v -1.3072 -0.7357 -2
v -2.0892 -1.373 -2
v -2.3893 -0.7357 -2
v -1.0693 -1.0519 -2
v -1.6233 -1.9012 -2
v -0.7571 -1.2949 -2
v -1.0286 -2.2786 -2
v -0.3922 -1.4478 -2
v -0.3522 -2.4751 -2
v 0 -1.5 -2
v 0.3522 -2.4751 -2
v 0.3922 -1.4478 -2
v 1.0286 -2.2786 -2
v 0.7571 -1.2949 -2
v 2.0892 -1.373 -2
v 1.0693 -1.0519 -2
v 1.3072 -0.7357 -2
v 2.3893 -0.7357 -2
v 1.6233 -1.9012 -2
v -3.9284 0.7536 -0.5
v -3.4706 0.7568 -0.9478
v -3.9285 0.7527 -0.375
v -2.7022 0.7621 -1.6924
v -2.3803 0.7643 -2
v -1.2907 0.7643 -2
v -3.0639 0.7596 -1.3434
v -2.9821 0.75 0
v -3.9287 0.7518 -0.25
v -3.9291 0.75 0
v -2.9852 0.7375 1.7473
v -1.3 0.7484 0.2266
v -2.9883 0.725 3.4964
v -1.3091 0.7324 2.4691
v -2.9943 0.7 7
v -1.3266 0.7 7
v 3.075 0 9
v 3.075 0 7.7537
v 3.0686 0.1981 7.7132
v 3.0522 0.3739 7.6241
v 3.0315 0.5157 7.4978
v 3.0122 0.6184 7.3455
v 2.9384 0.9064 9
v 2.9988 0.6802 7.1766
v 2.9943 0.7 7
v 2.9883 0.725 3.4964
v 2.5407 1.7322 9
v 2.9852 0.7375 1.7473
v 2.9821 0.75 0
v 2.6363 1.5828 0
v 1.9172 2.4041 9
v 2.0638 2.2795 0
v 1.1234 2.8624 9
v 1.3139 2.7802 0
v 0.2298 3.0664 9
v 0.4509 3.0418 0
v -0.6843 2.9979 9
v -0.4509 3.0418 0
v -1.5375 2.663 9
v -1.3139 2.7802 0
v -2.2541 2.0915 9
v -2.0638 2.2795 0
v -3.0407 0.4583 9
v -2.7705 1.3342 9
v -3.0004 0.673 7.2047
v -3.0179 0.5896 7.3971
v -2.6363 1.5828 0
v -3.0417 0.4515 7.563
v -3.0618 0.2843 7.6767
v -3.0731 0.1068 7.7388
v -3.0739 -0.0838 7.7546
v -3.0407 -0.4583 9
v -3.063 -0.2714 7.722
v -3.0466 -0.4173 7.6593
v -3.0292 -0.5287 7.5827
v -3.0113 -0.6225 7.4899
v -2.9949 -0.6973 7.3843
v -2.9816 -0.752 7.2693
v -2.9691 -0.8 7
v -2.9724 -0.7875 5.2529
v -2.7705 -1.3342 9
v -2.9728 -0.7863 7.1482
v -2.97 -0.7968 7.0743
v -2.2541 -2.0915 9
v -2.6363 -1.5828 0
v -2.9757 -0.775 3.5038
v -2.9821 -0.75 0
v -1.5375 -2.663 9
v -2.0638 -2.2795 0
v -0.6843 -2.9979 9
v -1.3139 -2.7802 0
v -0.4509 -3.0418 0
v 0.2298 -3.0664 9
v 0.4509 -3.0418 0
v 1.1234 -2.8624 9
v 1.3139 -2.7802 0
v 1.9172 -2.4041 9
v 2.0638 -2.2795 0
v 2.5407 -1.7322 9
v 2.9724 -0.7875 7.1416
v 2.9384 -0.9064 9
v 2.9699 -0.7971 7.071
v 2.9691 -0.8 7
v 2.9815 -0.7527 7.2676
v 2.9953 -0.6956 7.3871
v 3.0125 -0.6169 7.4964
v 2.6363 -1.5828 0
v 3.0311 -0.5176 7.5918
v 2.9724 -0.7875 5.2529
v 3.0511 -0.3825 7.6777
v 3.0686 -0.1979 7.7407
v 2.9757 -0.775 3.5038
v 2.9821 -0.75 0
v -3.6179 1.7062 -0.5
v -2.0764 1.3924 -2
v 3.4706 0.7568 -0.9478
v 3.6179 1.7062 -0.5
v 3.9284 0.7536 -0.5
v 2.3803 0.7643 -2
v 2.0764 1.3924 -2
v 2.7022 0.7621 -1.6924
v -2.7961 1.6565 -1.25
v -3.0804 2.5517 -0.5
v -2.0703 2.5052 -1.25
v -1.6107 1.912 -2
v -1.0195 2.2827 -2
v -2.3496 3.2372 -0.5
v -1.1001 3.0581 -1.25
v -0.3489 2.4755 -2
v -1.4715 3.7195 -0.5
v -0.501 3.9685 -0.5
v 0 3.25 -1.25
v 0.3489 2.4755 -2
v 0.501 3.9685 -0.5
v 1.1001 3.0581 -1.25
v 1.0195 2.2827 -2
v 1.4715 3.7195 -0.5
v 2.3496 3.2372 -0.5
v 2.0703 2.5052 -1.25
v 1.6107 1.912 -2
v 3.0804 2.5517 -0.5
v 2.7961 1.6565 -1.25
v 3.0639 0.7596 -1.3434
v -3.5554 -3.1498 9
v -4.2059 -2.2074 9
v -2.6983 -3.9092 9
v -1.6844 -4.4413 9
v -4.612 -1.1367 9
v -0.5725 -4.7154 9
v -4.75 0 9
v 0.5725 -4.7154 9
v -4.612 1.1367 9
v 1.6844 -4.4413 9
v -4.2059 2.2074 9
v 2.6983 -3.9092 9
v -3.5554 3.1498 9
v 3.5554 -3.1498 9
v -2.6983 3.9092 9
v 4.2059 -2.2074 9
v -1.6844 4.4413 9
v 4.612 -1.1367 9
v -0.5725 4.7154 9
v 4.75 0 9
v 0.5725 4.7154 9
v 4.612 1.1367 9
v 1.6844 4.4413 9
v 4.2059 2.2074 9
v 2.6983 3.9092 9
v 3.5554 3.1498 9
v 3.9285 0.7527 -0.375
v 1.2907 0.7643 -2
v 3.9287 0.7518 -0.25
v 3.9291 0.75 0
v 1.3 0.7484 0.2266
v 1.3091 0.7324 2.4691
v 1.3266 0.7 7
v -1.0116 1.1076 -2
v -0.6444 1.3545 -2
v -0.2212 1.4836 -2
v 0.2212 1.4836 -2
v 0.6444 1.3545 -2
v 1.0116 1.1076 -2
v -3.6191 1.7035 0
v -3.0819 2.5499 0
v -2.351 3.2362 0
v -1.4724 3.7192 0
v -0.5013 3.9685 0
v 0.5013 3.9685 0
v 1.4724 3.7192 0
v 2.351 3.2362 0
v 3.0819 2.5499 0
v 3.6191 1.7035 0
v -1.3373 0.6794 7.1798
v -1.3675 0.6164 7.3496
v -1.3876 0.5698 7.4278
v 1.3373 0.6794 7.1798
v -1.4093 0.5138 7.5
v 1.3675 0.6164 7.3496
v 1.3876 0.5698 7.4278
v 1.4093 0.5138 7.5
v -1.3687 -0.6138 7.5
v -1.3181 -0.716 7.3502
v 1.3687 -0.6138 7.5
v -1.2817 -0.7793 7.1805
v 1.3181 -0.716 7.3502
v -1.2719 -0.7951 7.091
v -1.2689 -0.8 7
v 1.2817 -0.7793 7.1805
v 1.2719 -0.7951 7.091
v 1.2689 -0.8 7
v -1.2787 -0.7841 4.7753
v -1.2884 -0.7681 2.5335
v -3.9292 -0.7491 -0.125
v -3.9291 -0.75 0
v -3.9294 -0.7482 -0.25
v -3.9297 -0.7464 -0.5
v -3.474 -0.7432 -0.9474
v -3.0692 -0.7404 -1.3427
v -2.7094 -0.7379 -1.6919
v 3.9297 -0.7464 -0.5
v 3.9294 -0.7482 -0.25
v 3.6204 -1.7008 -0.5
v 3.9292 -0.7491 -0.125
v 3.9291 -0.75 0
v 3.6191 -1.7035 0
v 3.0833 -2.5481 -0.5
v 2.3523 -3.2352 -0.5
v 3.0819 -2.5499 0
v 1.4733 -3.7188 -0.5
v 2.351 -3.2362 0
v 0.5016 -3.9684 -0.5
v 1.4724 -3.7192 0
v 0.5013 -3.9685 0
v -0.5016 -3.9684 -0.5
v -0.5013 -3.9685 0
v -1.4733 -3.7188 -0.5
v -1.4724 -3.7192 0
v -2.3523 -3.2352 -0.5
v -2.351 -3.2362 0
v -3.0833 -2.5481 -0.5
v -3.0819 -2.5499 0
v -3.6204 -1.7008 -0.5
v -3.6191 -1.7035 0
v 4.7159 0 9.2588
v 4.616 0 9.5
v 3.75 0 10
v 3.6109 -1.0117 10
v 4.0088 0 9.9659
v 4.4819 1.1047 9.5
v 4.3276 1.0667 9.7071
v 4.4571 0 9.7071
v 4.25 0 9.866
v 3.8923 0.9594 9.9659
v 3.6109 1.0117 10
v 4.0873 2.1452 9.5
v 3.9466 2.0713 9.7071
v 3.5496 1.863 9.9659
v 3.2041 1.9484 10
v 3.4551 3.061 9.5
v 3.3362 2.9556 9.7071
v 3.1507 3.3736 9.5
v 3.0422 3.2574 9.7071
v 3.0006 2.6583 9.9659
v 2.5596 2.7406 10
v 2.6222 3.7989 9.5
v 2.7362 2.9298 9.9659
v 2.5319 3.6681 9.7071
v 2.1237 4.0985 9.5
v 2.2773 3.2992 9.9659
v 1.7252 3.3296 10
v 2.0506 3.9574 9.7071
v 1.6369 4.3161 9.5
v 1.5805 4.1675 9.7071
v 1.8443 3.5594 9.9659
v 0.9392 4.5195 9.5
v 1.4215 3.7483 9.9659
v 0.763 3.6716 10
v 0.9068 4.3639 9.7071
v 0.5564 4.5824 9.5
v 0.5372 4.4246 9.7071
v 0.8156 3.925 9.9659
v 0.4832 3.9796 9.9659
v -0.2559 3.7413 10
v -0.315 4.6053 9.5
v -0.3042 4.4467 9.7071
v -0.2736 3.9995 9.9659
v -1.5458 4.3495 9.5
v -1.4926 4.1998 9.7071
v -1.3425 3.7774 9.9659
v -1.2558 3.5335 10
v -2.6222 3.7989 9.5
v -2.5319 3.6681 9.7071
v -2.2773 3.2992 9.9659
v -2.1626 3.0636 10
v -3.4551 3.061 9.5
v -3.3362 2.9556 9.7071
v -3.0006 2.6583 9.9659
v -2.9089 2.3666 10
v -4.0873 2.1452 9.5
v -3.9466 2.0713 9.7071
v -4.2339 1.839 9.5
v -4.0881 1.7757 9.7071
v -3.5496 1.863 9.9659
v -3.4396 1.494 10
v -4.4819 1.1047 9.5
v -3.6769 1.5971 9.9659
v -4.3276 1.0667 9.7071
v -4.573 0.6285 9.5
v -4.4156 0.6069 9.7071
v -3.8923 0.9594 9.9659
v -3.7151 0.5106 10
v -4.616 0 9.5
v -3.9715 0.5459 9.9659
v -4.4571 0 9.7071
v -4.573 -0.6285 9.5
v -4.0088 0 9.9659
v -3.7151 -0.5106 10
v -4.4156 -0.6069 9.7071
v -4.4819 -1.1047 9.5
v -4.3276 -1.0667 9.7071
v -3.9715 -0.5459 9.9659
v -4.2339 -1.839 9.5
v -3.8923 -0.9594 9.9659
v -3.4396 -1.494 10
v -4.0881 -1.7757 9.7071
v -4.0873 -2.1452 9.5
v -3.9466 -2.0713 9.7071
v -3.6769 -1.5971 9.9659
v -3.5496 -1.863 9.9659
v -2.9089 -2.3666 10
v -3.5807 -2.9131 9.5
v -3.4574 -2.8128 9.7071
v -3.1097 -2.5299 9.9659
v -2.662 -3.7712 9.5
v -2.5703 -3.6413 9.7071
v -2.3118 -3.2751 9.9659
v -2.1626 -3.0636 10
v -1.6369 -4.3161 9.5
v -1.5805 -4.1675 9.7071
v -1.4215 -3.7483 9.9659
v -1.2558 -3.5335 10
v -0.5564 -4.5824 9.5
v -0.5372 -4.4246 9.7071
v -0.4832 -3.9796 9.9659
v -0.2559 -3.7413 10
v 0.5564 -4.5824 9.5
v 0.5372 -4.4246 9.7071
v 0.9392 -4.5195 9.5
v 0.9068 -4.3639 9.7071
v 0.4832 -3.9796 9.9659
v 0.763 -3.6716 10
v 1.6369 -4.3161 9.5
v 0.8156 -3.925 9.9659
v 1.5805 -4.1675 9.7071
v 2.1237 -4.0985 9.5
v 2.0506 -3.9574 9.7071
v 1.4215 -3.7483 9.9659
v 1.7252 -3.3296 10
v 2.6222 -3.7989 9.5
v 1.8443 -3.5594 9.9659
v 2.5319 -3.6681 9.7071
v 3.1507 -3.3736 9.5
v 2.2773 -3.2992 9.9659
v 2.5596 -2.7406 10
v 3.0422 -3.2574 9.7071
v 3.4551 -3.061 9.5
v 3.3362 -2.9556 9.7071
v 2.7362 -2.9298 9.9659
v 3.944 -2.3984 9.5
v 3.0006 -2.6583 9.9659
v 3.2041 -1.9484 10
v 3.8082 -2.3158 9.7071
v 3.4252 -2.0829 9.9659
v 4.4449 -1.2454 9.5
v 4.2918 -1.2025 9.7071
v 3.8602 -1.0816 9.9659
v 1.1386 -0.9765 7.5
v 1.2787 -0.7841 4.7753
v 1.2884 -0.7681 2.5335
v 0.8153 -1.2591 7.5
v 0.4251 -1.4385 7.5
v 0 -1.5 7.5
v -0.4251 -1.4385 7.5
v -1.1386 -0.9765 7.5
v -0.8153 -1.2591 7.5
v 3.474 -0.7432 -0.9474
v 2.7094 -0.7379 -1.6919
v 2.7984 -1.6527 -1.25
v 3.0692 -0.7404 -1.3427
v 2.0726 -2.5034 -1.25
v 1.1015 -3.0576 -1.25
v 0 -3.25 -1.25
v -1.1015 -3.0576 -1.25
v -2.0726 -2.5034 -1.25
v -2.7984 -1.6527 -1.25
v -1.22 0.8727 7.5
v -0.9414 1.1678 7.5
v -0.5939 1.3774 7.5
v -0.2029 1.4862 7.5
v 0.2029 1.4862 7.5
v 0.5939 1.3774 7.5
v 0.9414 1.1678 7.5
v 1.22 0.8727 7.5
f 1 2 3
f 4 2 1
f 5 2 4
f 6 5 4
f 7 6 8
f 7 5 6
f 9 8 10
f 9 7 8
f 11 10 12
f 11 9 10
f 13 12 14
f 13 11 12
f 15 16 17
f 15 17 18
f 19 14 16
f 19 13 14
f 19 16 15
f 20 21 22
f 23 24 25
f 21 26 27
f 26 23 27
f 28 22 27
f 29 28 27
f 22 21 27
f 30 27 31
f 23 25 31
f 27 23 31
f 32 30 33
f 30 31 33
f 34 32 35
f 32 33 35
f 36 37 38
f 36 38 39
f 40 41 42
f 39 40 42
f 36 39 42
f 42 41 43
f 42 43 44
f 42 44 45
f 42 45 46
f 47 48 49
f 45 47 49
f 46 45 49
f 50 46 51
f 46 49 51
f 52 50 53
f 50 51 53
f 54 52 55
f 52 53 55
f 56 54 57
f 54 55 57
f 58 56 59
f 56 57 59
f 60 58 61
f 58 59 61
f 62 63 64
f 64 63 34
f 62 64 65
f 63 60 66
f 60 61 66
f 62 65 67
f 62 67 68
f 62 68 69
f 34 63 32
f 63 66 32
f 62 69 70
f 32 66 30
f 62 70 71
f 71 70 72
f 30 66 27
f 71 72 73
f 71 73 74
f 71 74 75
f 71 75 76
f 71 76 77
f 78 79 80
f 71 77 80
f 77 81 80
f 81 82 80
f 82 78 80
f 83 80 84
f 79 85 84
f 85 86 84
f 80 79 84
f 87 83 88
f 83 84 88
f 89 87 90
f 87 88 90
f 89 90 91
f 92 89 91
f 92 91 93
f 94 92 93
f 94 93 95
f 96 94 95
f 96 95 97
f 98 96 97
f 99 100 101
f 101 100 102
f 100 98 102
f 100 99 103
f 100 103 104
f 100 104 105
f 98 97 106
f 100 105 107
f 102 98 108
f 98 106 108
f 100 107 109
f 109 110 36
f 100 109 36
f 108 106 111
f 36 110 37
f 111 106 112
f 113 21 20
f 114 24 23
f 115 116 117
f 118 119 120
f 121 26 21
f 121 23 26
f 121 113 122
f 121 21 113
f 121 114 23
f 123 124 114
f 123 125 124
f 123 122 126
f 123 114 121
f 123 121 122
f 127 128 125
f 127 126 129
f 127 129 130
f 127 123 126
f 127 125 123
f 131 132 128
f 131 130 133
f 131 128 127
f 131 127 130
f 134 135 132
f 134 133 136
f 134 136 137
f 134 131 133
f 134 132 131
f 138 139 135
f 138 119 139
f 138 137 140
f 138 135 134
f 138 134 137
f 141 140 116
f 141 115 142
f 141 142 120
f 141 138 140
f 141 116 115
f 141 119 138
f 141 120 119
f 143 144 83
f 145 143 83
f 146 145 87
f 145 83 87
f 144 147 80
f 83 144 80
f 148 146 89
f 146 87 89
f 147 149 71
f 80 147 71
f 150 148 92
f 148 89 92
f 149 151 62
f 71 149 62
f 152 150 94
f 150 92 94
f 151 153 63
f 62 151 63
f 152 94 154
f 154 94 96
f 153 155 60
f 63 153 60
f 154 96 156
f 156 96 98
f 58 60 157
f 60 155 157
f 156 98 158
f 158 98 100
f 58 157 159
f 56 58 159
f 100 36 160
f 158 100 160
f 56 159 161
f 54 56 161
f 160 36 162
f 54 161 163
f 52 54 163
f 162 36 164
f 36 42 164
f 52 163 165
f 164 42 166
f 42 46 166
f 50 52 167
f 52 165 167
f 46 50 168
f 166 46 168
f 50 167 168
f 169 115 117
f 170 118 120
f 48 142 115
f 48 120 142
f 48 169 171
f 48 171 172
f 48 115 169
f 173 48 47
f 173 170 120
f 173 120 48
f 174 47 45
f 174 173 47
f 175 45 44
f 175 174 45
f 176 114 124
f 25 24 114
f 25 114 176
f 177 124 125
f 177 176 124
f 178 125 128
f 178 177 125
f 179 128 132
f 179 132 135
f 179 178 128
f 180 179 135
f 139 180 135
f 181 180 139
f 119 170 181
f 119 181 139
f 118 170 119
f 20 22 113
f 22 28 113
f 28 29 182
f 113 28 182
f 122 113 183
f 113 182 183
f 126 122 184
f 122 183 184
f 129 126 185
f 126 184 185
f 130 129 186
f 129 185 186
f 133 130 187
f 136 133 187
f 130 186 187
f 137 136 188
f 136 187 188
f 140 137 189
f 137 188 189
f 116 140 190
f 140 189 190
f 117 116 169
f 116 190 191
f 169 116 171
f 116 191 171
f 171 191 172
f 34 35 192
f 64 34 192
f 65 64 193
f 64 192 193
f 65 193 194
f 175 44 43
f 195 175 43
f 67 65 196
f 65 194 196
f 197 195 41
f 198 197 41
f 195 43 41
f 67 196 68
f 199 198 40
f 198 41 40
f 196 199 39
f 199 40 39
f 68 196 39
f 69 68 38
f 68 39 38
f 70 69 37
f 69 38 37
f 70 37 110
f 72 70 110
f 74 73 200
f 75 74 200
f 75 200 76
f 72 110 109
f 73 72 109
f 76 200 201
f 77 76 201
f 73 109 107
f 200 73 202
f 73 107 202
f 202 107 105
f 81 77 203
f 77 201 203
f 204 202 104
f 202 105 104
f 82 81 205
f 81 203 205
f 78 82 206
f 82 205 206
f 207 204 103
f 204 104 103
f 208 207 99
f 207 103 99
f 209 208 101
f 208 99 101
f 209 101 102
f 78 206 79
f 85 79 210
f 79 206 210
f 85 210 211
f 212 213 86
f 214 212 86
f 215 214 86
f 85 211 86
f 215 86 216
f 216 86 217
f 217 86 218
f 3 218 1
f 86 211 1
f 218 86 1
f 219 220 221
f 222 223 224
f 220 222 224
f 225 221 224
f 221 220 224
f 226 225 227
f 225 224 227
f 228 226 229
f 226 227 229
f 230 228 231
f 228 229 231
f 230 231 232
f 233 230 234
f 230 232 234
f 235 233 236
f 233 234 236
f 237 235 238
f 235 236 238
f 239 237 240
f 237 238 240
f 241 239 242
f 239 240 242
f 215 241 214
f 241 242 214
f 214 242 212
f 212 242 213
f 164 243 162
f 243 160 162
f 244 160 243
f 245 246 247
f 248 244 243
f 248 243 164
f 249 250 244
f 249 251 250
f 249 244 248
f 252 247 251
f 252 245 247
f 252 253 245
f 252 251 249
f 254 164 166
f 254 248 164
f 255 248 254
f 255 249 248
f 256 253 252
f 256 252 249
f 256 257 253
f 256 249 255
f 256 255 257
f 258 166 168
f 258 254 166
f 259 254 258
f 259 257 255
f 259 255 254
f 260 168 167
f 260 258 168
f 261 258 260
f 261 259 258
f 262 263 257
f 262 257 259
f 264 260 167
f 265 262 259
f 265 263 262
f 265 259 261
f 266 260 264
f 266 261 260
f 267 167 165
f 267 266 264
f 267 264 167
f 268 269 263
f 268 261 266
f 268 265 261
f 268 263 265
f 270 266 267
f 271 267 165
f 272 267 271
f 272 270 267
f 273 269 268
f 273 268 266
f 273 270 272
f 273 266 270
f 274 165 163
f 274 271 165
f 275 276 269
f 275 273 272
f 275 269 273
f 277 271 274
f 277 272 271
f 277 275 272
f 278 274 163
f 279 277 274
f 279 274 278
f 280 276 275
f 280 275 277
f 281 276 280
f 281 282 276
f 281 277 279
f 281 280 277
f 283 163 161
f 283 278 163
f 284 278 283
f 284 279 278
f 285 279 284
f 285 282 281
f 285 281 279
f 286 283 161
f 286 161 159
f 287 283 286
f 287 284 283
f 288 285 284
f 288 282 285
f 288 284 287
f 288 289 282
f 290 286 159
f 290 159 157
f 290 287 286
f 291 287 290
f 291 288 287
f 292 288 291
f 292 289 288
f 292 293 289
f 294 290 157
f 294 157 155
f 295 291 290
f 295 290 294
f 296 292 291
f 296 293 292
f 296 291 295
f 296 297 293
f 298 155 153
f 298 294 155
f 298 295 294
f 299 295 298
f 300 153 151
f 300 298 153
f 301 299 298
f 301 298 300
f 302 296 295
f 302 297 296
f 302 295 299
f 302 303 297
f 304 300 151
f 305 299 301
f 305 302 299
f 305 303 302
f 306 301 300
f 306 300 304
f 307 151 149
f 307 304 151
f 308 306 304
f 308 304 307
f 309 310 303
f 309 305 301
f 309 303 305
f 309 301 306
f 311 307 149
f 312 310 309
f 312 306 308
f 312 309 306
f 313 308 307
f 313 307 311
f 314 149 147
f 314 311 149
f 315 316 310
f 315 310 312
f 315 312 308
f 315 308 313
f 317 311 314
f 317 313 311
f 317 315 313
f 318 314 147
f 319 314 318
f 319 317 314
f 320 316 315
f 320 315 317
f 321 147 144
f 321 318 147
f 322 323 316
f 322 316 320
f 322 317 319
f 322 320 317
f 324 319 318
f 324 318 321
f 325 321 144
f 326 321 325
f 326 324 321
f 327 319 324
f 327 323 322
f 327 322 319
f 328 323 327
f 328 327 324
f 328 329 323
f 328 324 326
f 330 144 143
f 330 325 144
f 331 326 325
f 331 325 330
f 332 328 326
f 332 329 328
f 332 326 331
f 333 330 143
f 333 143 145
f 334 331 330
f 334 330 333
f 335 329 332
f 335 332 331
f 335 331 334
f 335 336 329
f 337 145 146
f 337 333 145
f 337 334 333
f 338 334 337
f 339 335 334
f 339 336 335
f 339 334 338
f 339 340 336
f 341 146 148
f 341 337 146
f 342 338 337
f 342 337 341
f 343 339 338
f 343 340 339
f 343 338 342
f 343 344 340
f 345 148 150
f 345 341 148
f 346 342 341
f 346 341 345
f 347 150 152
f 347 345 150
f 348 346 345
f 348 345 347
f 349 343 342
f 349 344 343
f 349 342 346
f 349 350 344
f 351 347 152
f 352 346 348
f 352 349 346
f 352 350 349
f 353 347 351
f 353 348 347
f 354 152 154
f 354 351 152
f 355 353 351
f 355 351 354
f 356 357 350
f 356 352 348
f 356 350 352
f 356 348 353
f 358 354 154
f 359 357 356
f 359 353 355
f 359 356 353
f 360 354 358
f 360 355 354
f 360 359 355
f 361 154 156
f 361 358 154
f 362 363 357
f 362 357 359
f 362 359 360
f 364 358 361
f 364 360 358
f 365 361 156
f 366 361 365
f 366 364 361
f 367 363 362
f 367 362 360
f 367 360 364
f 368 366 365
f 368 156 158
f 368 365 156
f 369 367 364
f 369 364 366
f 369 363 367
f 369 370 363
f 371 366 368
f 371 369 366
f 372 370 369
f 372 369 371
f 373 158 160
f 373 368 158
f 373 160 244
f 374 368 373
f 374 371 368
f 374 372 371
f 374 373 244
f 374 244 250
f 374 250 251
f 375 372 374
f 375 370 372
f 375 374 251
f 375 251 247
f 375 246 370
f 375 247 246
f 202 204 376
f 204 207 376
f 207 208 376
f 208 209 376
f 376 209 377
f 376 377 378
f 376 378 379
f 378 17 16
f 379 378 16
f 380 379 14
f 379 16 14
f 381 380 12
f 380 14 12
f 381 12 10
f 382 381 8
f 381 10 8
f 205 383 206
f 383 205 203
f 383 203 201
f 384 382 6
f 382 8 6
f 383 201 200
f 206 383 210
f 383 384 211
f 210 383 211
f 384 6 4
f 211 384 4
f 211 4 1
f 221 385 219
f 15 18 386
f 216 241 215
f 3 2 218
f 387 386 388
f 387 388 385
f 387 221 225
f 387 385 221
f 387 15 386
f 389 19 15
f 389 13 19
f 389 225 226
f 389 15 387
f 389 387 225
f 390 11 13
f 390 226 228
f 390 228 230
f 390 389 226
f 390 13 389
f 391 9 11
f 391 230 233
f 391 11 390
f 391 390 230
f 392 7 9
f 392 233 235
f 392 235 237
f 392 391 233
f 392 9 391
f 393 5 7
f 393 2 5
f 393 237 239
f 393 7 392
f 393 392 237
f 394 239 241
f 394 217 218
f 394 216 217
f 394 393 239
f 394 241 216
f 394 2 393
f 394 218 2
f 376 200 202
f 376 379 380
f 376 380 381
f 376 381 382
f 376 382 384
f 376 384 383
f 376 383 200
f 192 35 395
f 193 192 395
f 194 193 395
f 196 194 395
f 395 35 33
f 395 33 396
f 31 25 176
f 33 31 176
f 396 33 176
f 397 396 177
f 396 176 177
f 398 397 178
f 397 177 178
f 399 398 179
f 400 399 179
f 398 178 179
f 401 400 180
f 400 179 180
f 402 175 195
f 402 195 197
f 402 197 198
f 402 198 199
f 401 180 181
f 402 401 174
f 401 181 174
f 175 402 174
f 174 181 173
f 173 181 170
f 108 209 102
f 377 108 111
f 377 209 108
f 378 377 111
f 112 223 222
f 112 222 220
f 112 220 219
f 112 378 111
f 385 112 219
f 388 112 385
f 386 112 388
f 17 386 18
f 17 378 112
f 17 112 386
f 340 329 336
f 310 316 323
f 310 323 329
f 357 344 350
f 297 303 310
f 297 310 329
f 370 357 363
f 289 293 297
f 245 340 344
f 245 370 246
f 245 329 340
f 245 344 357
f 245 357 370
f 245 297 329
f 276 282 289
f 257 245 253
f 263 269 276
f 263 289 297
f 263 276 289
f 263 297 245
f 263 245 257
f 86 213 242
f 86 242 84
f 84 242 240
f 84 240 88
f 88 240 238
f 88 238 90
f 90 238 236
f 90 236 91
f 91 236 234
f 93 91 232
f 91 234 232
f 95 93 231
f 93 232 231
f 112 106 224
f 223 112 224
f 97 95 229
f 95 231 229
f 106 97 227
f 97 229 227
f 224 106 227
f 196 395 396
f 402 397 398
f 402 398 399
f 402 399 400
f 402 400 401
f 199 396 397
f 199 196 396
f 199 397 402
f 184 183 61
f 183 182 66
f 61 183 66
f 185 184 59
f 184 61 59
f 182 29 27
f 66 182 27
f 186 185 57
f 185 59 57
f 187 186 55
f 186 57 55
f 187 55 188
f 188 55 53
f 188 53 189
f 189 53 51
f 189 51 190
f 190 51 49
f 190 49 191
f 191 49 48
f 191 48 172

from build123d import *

# Parameters (mm, degrees)
F0_R           = 3.075
F1_DEPTH       = 9
F2_R           = 4.75
F2_R_2         = 3.075
F3_DEPTH       = 1
F4_R           = 0.99999
F5_R           = 4
F5_R_2         = 3.075
F6_DEPTH       = 2
F7_SIZE        = 1.5
F8_R           = 1.5
F9_DEPTH       = 9.5
F11_DEPTH      = 25
F11_DEPTH_BACK = 25


# Not quite as in the source:
# - a fillet or chamfer is up to 0.001 mm smaller than in the source, because OpenCascade refuses the exact size


with BuildPart() as f1:
    # F0 (on Top) → F1 (new body)
    with BuildSketch(Plane.XY):
        Circle(F0_R)
    extrude(amount=F1_DEPTH)

    # F2 (on face) → F3 (join)
    with BuildSketch(Plane.XY.offset(9)):
        Circle(F2_R)
        Circle(F2_R_2, mode=Mode.SUBTRACT)
        Circle(F2_R_2)
    extrude(amount=F3_DEPTH)

    # F4 (radius 1 in the source; OpenCascade refuses exactly that, so slightly less here)
    f4_edges = [f1.edges().sort_by_distance(p)[0] for p in [
        (-4.75, 0, 10),
    ]]
    fillet(f4_edges, radius=F4_R)

    # F5 (on face) → F6 (join)
    with BuildSketch(Plane(origin=(0, 0, 0), x_dir=(1, 0, 0), z_dir=(0, 0, -1))):
        Circle(F5_R)
        Circle(F5_R_2, mode=Mode.SUBTRACT)
        Circle(F5_R_2)
    extrude(amount=F6_DEPTH)

    # F7
    f7_edges = [f1.edges().sort_by_distance(p)[0] for p in [
        (-4, 0, -2),
    ]]
    chamfer(f7_edges, length=F7_SIZE)

    # F8 (on face) → F9 (cut)
    with BuildSketch(Plane(origin=(0, 0, -2), x_dir=(1, 0, 0), z_dir=(0, 0, -1))):
        Circle(F8_R)
    extrude(amount=-F9_DEPTH, mode=Mode.SUBTRACT)

    # F10 (on Right) → F11 (cut, two sides)
    with BuildSketch(Plane.YZ) as f11_sk:
        with BuildLine():
            Line((-0.7, -7), (0.8, -7))
            Line((0.8, -7), (0.7, 7))
            ThreePointArc((0.7, 7), (-0.05, 7.7553762753), (-0.8, 7))
            Line((-0.8, 7), (-0.7, -7))
        make_face()
    extrude(amount=F11_DEPTH, mode=Mode.SUBTRACT)
    extrude(f11_sk.sketch, amount=-F11_DEPTH_BACK, mode=Mode.SUBTRACT)


solid = f1.part
